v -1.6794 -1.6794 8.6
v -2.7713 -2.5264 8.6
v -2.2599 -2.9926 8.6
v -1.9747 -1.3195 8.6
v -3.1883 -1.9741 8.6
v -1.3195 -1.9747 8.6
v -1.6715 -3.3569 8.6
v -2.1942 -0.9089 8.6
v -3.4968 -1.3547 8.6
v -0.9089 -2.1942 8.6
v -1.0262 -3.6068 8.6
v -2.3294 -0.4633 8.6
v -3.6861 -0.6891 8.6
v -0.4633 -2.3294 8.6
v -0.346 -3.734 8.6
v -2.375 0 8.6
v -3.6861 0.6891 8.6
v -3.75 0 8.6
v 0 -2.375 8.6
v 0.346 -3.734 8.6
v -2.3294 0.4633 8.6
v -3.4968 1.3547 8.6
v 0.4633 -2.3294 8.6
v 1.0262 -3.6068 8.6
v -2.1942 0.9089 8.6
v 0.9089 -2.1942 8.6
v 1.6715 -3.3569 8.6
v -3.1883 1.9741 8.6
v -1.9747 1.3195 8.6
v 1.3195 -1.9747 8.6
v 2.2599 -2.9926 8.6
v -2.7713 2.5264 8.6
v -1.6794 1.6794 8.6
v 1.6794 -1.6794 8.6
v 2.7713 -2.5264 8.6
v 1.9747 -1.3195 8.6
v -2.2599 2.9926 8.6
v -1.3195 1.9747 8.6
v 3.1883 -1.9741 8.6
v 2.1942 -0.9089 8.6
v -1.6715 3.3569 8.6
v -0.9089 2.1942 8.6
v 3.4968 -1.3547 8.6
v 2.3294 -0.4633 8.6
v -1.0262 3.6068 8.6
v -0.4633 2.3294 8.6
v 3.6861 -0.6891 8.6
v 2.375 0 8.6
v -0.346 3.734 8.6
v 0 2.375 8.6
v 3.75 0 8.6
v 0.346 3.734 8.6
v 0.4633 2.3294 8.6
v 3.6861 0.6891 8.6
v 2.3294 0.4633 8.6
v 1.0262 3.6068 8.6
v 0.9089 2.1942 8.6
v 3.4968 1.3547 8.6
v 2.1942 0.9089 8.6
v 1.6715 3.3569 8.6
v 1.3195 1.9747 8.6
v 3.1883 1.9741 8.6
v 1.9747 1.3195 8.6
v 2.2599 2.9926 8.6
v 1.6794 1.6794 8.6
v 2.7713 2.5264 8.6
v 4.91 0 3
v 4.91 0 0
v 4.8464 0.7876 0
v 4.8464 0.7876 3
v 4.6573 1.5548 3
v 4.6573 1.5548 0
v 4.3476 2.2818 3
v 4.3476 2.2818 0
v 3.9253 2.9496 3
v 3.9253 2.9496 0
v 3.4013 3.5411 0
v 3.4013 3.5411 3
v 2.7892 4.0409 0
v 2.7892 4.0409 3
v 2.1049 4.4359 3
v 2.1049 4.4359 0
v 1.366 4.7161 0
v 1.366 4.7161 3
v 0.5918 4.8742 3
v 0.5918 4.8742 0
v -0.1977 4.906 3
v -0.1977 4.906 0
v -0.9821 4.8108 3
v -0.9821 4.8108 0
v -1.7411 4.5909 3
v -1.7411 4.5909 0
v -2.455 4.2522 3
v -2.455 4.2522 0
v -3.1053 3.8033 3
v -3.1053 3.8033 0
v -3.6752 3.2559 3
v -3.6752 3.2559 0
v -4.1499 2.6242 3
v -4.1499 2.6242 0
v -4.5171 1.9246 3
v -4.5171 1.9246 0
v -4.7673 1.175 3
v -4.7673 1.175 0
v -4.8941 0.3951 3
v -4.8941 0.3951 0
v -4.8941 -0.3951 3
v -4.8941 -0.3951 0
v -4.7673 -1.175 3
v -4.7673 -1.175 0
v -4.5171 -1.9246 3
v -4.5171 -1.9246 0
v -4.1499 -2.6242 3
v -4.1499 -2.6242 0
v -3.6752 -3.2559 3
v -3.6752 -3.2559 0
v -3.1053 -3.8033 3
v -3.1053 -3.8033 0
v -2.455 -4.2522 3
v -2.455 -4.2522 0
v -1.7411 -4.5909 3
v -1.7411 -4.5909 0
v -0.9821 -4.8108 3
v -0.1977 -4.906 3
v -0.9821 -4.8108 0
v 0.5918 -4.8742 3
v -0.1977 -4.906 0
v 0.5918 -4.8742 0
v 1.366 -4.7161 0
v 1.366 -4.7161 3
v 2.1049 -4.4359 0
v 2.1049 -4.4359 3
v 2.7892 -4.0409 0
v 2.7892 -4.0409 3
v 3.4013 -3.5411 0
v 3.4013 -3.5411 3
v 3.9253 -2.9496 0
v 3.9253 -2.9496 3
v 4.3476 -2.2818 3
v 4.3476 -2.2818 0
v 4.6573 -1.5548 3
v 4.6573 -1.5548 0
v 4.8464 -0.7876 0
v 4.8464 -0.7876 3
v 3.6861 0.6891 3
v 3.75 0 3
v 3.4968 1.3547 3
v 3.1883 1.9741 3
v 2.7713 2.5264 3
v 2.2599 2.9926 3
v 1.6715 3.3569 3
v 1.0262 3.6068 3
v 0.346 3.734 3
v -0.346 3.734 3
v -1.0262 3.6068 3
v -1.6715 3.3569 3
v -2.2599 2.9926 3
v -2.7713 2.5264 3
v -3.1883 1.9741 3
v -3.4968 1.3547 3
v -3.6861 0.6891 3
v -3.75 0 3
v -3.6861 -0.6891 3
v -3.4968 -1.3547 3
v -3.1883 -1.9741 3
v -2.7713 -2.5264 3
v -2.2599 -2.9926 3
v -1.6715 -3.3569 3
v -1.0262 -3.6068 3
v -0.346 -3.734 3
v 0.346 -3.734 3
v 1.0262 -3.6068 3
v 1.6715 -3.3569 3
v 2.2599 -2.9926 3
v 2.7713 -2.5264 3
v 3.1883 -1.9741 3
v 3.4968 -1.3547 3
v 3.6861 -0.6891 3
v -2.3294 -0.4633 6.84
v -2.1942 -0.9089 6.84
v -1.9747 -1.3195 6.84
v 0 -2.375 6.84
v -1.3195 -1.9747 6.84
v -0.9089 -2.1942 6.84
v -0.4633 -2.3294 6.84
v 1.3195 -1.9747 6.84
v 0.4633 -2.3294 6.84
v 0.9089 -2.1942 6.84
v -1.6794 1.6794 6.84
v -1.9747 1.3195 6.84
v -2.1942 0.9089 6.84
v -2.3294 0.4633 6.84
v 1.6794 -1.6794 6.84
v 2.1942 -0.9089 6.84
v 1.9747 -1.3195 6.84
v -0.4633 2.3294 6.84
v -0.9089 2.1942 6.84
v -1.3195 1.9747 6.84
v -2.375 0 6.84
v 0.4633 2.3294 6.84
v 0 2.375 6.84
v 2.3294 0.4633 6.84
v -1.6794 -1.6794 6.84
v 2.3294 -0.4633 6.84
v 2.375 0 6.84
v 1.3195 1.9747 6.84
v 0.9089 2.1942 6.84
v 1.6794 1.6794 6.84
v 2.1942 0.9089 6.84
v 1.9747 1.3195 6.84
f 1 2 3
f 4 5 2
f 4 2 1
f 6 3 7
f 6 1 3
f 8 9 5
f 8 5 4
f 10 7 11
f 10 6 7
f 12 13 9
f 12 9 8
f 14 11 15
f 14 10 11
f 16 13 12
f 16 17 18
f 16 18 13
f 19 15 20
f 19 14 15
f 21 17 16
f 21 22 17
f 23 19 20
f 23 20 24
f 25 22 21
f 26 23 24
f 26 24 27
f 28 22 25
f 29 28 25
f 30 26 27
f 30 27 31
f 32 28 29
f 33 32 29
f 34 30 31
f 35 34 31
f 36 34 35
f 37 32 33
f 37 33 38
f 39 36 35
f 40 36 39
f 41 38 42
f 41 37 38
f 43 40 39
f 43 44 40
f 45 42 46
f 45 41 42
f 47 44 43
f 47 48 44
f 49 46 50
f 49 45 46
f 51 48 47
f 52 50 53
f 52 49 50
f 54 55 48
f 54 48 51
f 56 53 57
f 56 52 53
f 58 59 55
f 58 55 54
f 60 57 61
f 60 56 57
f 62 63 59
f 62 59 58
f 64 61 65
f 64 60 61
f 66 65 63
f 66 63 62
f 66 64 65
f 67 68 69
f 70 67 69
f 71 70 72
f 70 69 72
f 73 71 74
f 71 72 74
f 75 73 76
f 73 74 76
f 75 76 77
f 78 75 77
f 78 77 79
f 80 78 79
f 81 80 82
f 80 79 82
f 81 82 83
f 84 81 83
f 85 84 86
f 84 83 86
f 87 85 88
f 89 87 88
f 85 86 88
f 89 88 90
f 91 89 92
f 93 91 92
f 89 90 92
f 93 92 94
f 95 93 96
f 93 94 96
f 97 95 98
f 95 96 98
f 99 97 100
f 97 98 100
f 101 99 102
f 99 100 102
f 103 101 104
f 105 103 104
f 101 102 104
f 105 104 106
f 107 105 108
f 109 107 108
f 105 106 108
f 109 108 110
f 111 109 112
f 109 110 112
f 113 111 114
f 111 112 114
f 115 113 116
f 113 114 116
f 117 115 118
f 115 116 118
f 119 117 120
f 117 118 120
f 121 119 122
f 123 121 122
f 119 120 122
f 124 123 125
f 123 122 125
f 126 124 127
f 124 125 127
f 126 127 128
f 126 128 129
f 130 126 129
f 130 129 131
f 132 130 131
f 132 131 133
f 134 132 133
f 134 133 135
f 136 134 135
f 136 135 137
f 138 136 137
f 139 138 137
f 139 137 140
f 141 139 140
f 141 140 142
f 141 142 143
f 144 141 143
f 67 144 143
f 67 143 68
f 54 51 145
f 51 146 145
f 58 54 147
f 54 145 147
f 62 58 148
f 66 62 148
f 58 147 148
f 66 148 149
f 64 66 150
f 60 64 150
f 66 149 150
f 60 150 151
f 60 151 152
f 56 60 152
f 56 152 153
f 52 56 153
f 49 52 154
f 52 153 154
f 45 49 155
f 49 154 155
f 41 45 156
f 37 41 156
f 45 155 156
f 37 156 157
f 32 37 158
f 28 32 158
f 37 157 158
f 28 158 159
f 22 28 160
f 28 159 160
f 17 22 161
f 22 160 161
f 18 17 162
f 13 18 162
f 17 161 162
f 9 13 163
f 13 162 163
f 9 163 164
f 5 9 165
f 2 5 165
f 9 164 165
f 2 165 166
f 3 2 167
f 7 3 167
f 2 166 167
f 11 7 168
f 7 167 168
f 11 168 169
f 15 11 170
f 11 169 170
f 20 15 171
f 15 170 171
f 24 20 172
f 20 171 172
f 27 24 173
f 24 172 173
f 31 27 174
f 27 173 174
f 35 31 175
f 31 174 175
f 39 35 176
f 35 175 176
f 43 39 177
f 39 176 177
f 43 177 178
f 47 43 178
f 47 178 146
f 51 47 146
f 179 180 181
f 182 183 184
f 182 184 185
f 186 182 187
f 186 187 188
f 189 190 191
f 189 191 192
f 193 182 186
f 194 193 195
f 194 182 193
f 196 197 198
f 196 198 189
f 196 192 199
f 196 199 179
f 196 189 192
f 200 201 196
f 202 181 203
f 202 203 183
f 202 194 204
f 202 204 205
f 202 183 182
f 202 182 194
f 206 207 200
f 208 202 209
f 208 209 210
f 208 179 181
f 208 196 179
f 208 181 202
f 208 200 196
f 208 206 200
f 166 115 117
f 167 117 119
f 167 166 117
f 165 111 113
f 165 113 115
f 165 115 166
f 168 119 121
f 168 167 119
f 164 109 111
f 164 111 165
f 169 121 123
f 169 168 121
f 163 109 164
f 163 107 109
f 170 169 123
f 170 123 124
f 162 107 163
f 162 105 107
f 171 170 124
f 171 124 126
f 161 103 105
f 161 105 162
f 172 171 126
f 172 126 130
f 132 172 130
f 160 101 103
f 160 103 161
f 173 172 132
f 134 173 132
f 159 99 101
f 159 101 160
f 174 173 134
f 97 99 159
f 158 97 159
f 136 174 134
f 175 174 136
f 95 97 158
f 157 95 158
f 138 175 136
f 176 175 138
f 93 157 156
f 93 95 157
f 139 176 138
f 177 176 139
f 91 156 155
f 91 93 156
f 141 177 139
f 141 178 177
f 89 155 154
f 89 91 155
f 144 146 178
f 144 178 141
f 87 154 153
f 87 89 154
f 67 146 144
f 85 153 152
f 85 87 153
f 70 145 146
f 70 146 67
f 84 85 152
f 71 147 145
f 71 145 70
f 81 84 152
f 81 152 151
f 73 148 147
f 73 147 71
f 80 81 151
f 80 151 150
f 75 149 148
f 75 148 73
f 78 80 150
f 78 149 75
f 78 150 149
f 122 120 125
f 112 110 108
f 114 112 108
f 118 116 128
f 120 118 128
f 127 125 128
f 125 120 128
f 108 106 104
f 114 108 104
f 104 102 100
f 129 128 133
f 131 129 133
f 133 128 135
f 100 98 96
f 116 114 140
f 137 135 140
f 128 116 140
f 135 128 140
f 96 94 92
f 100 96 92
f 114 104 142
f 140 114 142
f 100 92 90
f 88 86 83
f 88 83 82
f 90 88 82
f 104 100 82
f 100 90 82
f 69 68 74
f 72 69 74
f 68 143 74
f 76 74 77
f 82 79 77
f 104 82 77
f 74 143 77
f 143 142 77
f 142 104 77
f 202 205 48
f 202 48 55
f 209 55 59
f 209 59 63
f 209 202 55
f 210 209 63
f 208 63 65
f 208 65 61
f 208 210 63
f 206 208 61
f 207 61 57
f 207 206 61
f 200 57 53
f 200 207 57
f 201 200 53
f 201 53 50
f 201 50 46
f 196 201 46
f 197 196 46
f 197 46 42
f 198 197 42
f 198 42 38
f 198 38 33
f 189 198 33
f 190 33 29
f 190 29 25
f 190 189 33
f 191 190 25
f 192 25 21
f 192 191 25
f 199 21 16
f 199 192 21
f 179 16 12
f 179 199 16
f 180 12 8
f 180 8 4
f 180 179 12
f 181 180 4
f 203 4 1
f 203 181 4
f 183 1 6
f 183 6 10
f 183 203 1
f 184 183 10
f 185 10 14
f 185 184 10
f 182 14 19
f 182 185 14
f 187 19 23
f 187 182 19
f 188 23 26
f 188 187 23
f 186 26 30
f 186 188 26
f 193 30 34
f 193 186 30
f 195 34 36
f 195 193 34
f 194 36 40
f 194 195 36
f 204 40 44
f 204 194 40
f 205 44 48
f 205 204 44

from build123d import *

# Parameters (mm, degrees)
SKETCH1_R           = 4.91
BOSS_EXTRUDE1_DEPTH = 3
SKETCH4_R           = 3.75
BOSS_EXTRUDE3_DEPTH = 3.84
SKETCH2_R           = 3.75
SKETCH2_R_2         = 2.375
BOSS_EXTRUDE2_DEPTH = 1.76


with BuildPart() as part:
    # Sketch1 → Boss-Extrude1 (new body)
    with BuildSketch(Plane.XY):
        Circle(SKETCH1_R)
    extrude(amount=BOSS_EXTRUDE1_DEPTH)

    # Sketch4 → Boss-Extrude3 (add)
    with BuildSketch(Plane.XY.offset(3)):
        Circle(SKETCH4_R)
    extrude(amount=BOSS_EXTRUDE3_DEPTH)

    # Sketch2 → Boss-Extrude2 (add)
    with BuildSketch(Plane.XY.offset(6.84)):
        Circle(SKETCH2_R)
        Circle(SKETCH2_R_2, mode=Mode.SUBTRACT)
    extrude(amount=BOSS_EXTRUDE2_DEPTH)


solid = part.part
